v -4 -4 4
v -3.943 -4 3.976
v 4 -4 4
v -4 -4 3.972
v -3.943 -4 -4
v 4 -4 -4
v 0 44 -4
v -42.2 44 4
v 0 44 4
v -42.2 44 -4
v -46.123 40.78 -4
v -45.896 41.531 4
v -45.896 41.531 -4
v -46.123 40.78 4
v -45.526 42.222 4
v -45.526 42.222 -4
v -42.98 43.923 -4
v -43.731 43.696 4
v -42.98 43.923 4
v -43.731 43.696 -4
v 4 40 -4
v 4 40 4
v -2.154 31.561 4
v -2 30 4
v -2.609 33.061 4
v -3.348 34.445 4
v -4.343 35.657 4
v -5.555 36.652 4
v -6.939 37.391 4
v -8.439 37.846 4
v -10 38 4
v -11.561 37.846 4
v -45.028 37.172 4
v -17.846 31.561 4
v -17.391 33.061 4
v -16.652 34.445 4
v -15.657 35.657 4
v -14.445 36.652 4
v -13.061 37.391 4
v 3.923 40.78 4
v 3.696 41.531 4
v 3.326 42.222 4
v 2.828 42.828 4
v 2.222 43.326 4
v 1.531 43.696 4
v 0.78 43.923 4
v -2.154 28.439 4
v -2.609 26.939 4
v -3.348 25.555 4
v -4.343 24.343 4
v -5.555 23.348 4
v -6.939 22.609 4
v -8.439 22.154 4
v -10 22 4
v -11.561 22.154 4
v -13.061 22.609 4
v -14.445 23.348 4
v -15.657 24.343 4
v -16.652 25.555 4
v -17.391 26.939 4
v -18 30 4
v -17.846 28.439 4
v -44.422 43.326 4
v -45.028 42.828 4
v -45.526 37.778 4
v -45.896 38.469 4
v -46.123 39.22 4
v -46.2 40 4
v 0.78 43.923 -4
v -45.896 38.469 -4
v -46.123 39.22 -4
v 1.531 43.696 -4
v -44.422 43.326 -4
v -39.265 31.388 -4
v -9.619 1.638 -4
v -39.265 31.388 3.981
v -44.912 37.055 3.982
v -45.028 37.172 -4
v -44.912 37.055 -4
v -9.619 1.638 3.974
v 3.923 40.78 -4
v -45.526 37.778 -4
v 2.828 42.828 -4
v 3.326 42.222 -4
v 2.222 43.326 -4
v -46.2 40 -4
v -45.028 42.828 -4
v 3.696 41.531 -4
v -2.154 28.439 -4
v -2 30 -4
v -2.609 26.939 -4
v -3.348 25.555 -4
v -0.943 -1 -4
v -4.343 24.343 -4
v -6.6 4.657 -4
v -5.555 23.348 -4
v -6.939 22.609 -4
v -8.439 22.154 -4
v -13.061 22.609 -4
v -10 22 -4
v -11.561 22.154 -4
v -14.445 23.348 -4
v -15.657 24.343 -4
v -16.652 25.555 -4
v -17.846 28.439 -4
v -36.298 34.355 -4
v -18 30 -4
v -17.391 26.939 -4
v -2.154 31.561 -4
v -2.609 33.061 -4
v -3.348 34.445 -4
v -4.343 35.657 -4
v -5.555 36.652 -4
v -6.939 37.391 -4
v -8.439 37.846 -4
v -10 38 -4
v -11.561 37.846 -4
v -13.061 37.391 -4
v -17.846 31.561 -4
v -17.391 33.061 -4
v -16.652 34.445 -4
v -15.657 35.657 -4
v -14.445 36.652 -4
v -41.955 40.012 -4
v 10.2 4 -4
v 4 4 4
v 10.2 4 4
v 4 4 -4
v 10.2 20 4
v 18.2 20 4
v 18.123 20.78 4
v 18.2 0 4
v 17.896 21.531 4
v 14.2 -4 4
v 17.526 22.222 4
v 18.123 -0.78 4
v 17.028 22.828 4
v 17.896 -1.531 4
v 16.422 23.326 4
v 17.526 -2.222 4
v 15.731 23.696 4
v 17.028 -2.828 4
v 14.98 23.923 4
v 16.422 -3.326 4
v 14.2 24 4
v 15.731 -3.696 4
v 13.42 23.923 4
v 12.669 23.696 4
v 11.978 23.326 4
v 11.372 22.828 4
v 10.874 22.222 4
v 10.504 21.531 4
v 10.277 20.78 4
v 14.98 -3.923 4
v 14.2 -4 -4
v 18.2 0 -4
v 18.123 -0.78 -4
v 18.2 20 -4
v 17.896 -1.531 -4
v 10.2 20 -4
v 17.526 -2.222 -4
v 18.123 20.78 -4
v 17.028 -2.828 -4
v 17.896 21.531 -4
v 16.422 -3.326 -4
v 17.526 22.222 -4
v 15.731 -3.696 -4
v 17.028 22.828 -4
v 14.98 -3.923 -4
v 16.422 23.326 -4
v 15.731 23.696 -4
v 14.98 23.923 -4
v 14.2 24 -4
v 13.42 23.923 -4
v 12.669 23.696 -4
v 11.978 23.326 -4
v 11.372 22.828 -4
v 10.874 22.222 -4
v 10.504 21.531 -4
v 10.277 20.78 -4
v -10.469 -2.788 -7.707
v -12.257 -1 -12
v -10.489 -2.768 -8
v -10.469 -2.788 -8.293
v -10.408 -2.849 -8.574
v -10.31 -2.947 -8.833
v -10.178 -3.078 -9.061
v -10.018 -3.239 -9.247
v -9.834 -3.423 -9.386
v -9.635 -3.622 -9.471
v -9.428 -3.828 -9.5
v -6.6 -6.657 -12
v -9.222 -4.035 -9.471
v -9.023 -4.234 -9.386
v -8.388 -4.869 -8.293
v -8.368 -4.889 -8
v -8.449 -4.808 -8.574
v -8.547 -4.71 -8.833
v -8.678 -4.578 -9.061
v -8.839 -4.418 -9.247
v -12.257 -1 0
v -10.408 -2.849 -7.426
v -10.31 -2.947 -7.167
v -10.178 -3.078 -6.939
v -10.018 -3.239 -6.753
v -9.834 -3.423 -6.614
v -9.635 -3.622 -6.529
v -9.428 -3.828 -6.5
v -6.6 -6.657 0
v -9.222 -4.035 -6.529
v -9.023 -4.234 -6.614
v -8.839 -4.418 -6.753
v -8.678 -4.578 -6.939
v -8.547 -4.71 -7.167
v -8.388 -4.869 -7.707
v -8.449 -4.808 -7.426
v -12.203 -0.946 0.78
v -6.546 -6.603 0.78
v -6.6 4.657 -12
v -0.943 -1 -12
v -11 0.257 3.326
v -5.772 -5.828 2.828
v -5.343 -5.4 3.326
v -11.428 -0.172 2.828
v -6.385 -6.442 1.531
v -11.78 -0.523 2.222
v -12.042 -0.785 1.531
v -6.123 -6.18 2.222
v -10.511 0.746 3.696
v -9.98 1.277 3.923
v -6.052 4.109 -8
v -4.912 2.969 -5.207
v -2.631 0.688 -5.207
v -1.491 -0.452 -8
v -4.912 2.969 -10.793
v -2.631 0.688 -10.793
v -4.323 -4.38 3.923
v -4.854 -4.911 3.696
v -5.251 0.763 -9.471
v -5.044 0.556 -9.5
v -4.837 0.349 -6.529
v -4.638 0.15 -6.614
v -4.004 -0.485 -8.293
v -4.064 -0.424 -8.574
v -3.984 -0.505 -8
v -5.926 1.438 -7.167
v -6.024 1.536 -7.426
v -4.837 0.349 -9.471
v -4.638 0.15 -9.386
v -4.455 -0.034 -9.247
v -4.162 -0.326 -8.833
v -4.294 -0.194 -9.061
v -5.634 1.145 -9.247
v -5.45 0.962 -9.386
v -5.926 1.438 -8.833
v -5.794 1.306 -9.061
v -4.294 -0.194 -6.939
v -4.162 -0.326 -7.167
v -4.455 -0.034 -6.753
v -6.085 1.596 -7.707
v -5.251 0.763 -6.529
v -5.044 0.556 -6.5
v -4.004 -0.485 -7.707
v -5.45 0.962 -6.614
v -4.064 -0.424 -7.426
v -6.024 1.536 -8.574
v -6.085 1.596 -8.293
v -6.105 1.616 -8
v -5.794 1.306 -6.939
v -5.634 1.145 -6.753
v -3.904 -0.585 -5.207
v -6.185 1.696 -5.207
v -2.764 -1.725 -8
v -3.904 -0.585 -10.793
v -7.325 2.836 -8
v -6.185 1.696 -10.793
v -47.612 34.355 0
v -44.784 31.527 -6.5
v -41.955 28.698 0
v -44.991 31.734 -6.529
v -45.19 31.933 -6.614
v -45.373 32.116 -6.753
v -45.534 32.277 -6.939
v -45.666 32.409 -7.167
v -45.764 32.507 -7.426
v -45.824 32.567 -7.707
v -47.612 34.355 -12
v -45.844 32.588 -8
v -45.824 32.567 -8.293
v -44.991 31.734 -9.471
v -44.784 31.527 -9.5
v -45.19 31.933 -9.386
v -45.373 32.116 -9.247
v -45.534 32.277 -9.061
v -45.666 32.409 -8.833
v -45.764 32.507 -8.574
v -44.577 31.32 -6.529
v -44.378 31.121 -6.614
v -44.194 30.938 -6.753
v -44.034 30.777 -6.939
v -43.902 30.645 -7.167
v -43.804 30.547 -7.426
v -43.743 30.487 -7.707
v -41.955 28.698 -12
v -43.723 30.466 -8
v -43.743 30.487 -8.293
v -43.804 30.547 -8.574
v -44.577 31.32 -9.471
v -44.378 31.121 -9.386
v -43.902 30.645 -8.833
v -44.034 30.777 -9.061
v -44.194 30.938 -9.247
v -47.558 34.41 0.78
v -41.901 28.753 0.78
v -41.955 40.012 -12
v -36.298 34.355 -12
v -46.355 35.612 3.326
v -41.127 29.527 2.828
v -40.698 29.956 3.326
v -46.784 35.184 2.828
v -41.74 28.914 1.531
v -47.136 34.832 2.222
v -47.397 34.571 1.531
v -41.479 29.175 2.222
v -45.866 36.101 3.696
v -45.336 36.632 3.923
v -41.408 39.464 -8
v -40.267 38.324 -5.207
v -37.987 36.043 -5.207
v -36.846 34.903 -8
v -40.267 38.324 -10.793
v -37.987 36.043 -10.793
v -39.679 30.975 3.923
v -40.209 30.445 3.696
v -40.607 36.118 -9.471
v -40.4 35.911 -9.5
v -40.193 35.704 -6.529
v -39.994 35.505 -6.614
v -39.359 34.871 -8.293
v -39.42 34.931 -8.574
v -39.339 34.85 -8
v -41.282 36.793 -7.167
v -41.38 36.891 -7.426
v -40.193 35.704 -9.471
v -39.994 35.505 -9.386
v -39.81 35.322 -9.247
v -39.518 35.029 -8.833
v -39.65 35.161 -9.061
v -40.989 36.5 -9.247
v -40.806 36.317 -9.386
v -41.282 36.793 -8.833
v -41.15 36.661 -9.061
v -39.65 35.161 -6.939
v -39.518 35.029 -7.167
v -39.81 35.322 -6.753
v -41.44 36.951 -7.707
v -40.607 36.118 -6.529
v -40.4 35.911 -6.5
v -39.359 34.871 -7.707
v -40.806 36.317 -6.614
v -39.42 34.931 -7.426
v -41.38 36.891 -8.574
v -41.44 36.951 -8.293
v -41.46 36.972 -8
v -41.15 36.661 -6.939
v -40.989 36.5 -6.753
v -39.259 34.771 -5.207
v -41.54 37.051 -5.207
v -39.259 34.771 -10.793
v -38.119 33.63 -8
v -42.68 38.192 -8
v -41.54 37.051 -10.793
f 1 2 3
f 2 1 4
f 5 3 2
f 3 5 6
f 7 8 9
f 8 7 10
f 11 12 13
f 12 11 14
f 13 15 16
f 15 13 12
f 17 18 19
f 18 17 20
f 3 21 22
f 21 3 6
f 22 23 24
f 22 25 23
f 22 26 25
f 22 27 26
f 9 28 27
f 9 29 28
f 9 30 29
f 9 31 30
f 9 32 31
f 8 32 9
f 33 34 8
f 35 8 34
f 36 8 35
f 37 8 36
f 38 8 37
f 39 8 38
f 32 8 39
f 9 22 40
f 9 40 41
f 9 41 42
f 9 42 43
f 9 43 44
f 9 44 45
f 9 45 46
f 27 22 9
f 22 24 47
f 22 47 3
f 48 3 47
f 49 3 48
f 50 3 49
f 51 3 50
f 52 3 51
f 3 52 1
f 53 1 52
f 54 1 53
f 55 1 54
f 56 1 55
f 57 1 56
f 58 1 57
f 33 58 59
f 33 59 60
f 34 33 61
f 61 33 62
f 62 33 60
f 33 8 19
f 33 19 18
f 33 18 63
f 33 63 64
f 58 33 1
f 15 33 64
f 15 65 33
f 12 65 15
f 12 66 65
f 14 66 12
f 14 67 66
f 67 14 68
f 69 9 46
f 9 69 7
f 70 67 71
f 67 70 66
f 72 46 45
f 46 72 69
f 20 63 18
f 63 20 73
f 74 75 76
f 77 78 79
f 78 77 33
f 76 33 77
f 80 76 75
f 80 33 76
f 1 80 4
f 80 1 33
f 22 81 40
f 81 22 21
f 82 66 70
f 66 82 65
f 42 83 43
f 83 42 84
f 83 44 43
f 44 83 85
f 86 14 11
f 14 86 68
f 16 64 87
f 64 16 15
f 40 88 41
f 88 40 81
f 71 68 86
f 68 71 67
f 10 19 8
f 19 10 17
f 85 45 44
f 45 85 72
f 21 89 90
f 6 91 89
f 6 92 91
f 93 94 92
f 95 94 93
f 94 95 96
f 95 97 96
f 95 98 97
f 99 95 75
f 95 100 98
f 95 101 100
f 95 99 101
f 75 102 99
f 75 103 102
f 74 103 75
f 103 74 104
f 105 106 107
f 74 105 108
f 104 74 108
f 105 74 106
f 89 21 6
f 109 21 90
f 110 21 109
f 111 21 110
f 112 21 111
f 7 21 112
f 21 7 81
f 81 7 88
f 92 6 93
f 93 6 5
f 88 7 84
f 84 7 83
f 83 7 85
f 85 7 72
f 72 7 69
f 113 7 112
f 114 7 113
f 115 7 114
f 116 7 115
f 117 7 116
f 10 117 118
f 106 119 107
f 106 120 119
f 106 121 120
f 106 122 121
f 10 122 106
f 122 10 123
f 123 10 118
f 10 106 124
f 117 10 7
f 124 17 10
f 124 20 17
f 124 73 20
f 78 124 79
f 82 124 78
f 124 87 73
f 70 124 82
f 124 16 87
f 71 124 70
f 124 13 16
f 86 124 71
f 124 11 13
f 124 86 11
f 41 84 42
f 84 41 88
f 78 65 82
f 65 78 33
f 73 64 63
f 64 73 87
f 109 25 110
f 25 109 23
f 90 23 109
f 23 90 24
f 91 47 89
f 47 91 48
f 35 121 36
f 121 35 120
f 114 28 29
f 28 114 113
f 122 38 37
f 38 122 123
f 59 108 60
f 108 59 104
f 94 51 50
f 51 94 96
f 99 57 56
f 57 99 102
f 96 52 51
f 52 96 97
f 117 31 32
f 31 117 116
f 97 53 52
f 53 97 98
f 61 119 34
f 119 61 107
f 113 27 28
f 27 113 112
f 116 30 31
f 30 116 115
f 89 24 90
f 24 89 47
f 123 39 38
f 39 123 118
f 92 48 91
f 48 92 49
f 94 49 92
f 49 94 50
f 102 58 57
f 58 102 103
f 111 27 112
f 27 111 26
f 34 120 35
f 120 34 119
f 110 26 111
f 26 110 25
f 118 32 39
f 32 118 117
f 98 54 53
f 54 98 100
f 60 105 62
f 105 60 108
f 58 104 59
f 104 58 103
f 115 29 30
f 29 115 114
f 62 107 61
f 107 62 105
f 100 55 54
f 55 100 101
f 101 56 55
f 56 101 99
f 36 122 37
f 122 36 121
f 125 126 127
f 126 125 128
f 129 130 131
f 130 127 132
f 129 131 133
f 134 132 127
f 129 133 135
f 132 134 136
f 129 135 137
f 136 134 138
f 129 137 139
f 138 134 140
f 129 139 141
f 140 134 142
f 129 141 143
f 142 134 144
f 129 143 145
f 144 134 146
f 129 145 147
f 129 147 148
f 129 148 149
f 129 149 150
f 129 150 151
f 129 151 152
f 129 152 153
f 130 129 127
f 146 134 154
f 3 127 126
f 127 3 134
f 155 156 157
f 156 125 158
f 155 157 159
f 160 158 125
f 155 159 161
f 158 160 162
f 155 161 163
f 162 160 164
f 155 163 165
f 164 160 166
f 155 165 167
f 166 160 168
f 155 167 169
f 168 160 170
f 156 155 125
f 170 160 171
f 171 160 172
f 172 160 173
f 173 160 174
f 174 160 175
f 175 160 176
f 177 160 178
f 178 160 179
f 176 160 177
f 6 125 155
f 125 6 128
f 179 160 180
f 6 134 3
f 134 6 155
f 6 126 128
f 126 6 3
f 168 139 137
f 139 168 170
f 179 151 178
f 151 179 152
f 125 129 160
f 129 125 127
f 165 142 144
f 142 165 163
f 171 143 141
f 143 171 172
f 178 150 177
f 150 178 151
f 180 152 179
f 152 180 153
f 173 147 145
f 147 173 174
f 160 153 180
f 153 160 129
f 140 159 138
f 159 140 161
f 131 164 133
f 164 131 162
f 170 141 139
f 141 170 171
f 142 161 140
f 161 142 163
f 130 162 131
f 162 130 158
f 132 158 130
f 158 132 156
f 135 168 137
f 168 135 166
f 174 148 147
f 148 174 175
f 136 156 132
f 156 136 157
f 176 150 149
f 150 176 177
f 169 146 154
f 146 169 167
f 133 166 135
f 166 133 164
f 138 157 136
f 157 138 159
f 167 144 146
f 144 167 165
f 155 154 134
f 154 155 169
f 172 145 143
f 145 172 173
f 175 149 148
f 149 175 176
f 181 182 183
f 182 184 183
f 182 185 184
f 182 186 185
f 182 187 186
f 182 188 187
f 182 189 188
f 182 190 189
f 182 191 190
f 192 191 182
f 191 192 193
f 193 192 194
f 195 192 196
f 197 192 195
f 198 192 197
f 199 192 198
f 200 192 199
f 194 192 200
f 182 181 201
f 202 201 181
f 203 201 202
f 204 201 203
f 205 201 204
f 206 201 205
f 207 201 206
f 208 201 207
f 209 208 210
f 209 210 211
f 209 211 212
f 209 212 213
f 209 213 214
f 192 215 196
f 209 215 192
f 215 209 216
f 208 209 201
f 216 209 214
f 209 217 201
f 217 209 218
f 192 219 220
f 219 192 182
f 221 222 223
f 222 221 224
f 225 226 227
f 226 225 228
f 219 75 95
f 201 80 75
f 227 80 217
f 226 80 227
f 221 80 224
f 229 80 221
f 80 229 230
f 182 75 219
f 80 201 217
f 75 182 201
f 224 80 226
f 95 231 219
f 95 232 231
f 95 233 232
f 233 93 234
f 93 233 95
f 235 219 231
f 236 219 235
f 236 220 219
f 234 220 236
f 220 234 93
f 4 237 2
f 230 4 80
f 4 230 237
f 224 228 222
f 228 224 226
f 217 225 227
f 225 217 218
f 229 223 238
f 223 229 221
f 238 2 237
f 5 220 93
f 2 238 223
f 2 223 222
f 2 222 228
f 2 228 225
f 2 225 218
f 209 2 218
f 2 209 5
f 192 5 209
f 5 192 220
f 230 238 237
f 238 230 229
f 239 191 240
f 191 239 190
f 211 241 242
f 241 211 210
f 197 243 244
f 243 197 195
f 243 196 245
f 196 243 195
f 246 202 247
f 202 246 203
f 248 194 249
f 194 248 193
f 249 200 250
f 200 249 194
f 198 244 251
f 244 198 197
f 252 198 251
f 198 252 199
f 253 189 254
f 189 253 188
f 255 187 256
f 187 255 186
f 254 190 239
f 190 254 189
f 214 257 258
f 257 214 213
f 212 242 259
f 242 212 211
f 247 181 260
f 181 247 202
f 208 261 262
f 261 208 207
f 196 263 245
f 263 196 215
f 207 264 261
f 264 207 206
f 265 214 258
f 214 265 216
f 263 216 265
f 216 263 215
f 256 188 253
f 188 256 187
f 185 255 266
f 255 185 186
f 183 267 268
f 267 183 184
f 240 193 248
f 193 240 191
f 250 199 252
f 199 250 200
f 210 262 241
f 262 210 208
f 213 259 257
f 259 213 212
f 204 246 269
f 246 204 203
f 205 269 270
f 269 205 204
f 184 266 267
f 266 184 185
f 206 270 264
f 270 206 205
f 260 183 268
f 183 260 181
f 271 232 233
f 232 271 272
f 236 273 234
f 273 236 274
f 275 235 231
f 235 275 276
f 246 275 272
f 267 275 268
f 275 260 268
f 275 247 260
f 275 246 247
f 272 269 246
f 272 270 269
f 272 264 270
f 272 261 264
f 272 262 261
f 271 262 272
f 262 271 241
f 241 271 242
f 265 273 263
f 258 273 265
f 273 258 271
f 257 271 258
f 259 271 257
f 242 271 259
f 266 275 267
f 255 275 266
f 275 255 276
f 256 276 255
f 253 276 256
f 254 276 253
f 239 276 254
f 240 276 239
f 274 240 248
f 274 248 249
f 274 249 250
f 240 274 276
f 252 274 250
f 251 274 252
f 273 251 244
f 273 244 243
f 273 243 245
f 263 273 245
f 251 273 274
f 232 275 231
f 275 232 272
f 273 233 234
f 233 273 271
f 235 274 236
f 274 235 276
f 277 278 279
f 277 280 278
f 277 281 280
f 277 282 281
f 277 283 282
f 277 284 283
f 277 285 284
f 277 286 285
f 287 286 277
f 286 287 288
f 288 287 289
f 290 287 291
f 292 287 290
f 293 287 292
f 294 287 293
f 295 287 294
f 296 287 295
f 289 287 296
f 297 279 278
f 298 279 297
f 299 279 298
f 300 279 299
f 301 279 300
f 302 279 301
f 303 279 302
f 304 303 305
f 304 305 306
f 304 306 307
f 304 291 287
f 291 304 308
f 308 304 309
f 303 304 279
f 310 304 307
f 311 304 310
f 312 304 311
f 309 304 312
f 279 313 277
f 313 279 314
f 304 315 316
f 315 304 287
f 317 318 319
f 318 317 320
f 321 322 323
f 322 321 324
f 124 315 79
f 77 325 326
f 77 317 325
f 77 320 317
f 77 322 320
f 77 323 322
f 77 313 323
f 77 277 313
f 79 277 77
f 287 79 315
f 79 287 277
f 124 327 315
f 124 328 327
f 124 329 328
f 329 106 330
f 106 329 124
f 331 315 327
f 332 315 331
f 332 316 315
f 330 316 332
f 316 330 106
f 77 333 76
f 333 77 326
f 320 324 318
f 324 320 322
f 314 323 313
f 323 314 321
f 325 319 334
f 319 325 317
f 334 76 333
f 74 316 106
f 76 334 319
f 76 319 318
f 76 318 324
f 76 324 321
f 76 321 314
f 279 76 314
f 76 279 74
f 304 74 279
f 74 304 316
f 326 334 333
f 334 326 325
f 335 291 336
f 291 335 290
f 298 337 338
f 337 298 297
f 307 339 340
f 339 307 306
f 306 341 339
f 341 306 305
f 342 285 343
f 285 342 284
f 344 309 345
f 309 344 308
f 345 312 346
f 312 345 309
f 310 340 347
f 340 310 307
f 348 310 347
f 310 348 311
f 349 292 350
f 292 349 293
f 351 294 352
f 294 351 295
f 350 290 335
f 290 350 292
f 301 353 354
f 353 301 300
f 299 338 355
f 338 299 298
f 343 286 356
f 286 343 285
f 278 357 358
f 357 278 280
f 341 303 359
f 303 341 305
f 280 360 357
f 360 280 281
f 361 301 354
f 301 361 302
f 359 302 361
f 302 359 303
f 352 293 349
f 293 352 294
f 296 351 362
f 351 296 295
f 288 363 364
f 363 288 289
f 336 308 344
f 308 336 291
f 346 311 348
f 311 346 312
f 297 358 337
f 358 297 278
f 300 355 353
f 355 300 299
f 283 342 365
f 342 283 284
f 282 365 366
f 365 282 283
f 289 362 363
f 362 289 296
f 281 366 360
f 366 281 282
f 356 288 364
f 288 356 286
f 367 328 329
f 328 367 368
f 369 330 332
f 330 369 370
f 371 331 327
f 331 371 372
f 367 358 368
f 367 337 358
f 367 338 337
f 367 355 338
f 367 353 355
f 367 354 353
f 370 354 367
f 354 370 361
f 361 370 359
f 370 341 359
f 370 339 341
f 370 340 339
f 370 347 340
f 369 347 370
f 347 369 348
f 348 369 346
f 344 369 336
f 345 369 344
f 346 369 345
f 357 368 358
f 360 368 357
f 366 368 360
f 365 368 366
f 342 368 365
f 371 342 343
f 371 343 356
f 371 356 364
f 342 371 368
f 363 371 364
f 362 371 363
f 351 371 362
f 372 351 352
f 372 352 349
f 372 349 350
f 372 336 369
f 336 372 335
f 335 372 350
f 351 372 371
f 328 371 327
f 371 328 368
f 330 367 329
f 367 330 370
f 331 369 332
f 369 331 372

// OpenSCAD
$fn=32;

if (0) {
rotate([0, 0, -135])
    translate([-222, -1253, 0])
        import("/home/bhack/STL/SHK-M_LCD_L.stl", convexity=3);
}


// MX UTILITIES
function mX_dia(s=3) = s+0.2;
function mX_head_dia(s=3) = s+3;

module mX_slot_thread(size=3, depth=5) {
    cylinder(d=size, h=depth, center=true);
}
    
module mX_slot(size=3, width=10, depth=5, recess=2, adjust=0) {
    union() {
      hull() {
        cylinder(d=mX_dia(size), h=depth, center=true);
        translate([adjust, 0, 0]) cylinder(d=mX_dia(size), h=depth, center=true);
      }
        
      translate([0, 0, (depth-recess)/2])
        hull() {
          cylinder(d=mX_head_dia(size), h=recess, center=true);
          translate([adjust, 0, 0])
            cylinder(d=mX_head_dia(size), h=recess, center=true);
        }
    }   
  
}

module m3_t_slot() {
    union() {
        cube([10, 3.8, 7], center=true);
        cube([2.65, 6, 7], center=true);
    }
}
// MX UTILITIES - END

module lug() {
    difference() {
        hull() {
            translate([0, 0, 4]) cube([8, 8, 8], center=true);
            
            translate([0, 0, -4]) 
            rotate([0, 90, 0])
                cylinder(d=8, h=8, center=true);
        }
        
        translate([0, 0, 4])
            rotate([90, 0, 0])
                cylinder(d=3, h=80, center=true);
        
        translate([0, -2.2, 4])
            rotate([90, 0, 0])
                #cylinder(r=5.5/2/cos(180/6)+0.05, h=2, $fn=6);
    }
}
    
module lugs(flip=false) {
    if (flip) {
        translate([0, 0, -8]) {
            rotate([0, 180, 0])
                lug();

            translate([50, 0, 0])
                rotate([0, 180, 0])
                    lug();
        }
    }
    else {
        lug();
    
        translate([50, 0, 0])
            lug();
    }
}

module hook() {
    union() {
        translate([0, 5+0.1, 0]) 
            cube([8, 10+0.2, 8], center=true);
        
        hull() {
            cylinder(d=8, h=8, center=true);
            translate([20, 0, 0]) cylinder(d=8, h=8, center=true);
        }
    }
}

module body() {
    difference() {
        hull() {
            cube([8, 8, 8], center=true);
            translate([-42.2, 40, 0]) cylinder(d=8, h=8, center=true);
            translate([0, 40, 0]) cylinder(d=8, h=8, center=true);
        }
        
        translate([-10, 30, 0])
            cylinder(d=16, h=8, center=true);
    }
}

module support_l() {
    union() {
        // body
        body();
        
        // hook
        rotate([0, 0, 90])
            translate([0, -16+1.8, 0])
                hook();
        
        // lugs
        translate([-6.6, -1, 4])
            rotate([0, 0, 135])
                lugs();
    }
}

module support_r() {
    union() {
        // body
        body();
        
        // hook
        rotate([0, 0, 90])
            translate([0, -16+1.8, 0])
                hook();
        
        // lugs
        translate([-6.6, -1, 4])
            rotate([0, 0, 135])
                lugs(flip=true);
    }
}


support_r();
